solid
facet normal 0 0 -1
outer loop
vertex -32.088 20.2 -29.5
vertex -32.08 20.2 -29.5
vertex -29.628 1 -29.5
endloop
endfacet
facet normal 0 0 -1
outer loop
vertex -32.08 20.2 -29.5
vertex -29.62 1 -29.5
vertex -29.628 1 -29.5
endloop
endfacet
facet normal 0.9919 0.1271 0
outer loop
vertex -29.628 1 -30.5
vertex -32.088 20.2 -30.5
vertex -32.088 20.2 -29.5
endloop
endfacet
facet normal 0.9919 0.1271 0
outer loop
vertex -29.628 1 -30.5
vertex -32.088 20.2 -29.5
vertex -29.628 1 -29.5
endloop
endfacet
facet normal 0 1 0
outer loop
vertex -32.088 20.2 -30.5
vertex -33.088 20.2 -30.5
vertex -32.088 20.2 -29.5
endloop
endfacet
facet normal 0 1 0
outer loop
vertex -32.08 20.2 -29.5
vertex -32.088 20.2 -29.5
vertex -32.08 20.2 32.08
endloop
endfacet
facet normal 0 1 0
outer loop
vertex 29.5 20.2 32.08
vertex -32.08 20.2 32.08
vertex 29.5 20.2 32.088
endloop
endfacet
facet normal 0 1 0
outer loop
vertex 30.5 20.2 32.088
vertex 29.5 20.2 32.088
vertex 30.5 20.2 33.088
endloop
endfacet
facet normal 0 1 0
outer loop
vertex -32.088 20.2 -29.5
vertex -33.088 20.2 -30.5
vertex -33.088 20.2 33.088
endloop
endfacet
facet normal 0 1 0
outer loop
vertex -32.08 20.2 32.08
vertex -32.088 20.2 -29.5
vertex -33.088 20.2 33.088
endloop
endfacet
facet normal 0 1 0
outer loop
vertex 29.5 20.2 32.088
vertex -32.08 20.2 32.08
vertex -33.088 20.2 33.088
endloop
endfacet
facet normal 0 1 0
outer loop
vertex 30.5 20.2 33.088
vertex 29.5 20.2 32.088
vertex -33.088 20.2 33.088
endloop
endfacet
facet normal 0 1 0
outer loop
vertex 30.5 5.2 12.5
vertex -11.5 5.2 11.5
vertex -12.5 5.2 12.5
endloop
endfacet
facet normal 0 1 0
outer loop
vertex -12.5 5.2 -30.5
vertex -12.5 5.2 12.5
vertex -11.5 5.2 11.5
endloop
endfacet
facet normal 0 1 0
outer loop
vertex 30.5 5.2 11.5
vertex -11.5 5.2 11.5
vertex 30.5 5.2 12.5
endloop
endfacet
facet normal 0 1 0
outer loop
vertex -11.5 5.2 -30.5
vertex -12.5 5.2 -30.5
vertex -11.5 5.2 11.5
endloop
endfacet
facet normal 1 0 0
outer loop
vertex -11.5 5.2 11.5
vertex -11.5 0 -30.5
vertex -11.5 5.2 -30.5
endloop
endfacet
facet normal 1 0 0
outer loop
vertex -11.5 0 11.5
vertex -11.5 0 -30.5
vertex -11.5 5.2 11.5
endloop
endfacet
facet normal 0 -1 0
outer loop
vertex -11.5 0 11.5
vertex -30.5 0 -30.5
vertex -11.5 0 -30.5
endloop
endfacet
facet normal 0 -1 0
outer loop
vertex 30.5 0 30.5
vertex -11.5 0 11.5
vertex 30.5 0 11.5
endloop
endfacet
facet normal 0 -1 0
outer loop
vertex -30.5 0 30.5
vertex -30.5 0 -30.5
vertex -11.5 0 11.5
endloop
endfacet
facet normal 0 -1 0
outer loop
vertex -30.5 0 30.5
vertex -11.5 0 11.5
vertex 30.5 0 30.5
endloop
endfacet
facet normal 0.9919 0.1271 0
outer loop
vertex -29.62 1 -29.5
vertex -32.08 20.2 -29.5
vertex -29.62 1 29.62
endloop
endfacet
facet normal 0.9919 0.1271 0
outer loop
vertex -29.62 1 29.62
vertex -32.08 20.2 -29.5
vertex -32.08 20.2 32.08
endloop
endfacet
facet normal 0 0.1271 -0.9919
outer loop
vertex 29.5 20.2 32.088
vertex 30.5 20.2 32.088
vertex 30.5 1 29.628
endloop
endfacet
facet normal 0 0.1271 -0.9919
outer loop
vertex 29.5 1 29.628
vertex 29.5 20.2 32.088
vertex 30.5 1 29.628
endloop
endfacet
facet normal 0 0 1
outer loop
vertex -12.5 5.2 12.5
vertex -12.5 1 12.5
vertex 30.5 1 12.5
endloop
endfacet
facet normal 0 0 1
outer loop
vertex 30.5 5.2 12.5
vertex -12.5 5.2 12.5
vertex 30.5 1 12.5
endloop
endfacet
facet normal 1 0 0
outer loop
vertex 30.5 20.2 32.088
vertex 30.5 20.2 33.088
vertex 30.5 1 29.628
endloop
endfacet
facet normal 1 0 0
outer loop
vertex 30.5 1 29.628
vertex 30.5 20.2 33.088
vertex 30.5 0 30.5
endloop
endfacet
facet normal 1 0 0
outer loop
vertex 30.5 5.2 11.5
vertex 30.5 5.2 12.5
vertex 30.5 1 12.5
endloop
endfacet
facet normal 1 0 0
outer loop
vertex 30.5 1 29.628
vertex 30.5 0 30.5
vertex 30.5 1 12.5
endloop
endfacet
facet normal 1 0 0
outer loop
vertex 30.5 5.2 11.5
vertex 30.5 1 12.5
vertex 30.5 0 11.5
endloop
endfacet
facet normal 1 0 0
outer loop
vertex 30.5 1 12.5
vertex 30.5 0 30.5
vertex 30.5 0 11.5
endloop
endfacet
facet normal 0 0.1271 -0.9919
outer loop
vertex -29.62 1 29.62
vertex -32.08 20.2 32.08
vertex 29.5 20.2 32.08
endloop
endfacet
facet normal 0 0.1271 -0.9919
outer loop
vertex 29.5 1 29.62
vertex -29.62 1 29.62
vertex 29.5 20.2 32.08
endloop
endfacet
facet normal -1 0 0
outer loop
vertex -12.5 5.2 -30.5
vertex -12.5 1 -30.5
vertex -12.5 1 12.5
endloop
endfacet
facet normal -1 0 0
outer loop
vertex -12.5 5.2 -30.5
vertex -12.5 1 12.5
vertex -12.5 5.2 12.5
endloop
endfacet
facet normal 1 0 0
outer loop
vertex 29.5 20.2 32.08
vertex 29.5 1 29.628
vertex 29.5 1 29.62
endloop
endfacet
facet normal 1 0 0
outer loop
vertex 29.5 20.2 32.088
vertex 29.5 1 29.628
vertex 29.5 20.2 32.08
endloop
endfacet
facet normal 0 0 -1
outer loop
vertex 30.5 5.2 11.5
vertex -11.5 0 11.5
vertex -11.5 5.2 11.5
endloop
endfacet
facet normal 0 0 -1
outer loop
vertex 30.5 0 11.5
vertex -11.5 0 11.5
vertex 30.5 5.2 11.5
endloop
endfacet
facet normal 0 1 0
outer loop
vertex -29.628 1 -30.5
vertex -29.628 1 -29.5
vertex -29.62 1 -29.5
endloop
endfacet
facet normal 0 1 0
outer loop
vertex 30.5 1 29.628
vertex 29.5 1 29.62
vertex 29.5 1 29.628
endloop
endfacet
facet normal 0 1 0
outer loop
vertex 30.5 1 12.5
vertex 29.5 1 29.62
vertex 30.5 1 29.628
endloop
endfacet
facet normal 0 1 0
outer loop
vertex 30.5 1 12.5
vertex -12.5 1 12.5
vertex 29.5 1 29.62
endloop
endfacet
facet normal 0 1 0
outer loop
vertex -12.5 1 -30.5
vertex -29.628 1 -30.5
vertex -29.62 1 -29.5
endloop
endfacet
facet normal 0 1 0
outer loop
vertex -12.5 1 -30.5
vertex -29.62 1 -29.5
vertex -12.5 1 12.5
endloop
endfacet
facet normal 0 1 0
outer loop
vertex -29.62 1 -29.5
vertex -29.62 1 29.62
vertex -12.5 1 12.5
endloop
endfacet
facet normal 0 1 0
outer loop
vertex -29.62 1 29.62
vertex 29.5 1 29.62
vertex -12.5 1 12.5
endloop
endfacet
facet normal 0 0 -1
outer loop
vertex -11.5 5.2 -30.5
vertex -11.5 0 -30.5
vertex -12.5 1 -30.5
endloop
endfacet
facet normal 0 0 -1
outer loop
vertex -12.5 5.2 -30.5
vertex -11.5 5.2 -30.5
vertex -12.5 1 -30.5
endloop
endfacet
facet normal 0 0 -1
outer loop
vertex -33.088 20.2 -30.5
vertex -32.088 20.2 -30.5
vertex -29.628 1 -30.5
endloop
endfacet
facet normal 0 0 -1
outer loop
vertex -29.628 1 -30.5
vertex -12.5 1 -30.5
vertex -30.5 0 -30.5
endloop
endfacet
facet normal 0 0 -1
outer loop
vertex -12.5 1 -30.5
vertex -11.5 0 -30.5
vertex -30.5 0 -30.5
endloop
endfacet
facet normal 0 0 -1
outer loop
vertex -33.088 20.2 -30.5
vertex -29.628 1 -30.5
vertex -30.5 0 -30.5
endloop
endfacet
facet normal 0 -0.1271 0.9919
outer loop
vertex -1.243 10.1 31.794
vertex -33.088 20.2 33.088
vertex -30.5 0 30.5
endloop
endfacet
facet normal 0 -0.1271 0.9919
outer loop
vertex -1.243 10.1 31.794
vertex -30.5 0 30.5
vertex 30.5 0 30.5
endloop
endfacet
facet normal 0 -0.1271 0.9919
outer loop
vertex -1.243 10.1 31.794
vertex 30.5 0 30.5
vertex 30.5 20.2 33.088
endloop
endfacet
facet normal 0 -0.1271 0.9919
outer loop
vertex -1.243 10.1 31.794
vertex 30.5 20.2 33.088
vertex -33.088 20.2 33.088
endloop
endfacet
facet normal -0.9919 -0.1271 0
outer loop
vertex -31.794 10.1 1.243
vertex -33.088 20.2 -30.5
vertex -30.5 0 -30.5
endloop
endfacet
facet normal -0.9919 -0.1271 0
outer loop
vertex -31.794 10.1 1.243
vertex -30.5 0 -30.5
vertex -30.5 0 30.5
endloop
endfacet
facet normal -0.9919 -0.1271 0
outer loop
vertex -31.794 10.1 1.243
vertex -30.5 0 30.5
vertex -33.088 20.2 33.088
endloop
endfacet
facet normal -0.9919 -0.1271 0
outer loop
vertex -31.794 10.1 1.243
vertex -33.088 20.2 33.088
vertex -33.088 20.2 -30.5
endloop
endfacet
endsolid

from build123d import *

# Parameters (mm, degrees)
PAD_DEPTH       = 20.2
PAD_TAPER       = -7.3
POCKET_DEPTH    = 20.2
THICKNESS_T     = -1
POCKET001_DEPTH = 1
POCKET002_DEPTH = 1
POCKET003_DEPTH = 15


with BuildPart() as part:
    # Sketch → Pad (new body)
    with BuildSketch(Plane.XZ):
        Polygon((-30.5, -30.5), (-30.5, 30.5), (30.5, 30.5), (30.5, 11.5), (-11.5, 11.5), (-11.5, -30.5), align=None)
    extrude(amount=-PAD_DEPTH, taper=PAD_TAPER)

    # Sketch001 (on Face7 of Pad) → Pocket (cut)
    with BuildSketch(Plane.XZ):
        Polygon((-30.5, -30.5), (-11.5, -30.5), (-11.5, 11.5), (30.5, 11.5), (30.5, 30.5), (30.5, 40.5), (40.5, 40.5), (40.5, -40.5), (-40.5, -40.5), (-40.5, -30.5), align=None)
    extrude(amount=-POCKET_DEPTH, mode=Mode.SUBTRACT)

    # Thickness
    thickness_openings = [part.faces().sort_by_distance(p)[0] for p in [
        (-32.188414, 20.2, 1.29384),
    ]]
    offset(amount=THICKNESS_T, openings=thickness_openings, kind=Kind.INTERSECTION)

    # Sketch002 (on Face2 of Thickness) → Pocket001 (cut)
    with BuildSketch(Plane(origin=(0, 0, -30.5), x_dir=(1, 0, 0), z_dir=(0, 0, -1))):
        Polygon((-32.08768, -20.2), (-29.628103, -1), (-12.5, -1), (-12.5, -20.2), align=None)
    extrude(amount=-POCKET001_DEPTH, mode=Mode.SUBTRACT)

    # Sketch003 (on Face6 of Thickness) → Pocket002 (cut)
    with BuildSketch(Plane.YZ.offset(30.5)):
        Polygon((20.2, 32.08768), (1, 29.628103), (1, 12.5), (20.2, 12.5), align=None)
    extrude(amount=-POCKET002_DEPTH, mode=Mode.SUBTRACT)

    # Pocket002 Face9 → Pocket003 (cut)
    with BuildSketch(Plane(origin=(-1.376471, 20.2, 1.376471), x_dir=(1, 0, 0), z_dir=(0, 1, 0))):
        Polygon((31.876471, -11.123529), (31.876471, -10.123529), (-10.123529, -10.123529), (-10.123529, 31.876471), (-11.123529, 31.876471), (-11.123529, 30.876471), (-11.123529, -11.123529), (30.876471, -11.123529), align=None)
    extrude(amount=-POCKET003_DEPTH, mode=Mode.SUBTRACT)


solid = part.part
